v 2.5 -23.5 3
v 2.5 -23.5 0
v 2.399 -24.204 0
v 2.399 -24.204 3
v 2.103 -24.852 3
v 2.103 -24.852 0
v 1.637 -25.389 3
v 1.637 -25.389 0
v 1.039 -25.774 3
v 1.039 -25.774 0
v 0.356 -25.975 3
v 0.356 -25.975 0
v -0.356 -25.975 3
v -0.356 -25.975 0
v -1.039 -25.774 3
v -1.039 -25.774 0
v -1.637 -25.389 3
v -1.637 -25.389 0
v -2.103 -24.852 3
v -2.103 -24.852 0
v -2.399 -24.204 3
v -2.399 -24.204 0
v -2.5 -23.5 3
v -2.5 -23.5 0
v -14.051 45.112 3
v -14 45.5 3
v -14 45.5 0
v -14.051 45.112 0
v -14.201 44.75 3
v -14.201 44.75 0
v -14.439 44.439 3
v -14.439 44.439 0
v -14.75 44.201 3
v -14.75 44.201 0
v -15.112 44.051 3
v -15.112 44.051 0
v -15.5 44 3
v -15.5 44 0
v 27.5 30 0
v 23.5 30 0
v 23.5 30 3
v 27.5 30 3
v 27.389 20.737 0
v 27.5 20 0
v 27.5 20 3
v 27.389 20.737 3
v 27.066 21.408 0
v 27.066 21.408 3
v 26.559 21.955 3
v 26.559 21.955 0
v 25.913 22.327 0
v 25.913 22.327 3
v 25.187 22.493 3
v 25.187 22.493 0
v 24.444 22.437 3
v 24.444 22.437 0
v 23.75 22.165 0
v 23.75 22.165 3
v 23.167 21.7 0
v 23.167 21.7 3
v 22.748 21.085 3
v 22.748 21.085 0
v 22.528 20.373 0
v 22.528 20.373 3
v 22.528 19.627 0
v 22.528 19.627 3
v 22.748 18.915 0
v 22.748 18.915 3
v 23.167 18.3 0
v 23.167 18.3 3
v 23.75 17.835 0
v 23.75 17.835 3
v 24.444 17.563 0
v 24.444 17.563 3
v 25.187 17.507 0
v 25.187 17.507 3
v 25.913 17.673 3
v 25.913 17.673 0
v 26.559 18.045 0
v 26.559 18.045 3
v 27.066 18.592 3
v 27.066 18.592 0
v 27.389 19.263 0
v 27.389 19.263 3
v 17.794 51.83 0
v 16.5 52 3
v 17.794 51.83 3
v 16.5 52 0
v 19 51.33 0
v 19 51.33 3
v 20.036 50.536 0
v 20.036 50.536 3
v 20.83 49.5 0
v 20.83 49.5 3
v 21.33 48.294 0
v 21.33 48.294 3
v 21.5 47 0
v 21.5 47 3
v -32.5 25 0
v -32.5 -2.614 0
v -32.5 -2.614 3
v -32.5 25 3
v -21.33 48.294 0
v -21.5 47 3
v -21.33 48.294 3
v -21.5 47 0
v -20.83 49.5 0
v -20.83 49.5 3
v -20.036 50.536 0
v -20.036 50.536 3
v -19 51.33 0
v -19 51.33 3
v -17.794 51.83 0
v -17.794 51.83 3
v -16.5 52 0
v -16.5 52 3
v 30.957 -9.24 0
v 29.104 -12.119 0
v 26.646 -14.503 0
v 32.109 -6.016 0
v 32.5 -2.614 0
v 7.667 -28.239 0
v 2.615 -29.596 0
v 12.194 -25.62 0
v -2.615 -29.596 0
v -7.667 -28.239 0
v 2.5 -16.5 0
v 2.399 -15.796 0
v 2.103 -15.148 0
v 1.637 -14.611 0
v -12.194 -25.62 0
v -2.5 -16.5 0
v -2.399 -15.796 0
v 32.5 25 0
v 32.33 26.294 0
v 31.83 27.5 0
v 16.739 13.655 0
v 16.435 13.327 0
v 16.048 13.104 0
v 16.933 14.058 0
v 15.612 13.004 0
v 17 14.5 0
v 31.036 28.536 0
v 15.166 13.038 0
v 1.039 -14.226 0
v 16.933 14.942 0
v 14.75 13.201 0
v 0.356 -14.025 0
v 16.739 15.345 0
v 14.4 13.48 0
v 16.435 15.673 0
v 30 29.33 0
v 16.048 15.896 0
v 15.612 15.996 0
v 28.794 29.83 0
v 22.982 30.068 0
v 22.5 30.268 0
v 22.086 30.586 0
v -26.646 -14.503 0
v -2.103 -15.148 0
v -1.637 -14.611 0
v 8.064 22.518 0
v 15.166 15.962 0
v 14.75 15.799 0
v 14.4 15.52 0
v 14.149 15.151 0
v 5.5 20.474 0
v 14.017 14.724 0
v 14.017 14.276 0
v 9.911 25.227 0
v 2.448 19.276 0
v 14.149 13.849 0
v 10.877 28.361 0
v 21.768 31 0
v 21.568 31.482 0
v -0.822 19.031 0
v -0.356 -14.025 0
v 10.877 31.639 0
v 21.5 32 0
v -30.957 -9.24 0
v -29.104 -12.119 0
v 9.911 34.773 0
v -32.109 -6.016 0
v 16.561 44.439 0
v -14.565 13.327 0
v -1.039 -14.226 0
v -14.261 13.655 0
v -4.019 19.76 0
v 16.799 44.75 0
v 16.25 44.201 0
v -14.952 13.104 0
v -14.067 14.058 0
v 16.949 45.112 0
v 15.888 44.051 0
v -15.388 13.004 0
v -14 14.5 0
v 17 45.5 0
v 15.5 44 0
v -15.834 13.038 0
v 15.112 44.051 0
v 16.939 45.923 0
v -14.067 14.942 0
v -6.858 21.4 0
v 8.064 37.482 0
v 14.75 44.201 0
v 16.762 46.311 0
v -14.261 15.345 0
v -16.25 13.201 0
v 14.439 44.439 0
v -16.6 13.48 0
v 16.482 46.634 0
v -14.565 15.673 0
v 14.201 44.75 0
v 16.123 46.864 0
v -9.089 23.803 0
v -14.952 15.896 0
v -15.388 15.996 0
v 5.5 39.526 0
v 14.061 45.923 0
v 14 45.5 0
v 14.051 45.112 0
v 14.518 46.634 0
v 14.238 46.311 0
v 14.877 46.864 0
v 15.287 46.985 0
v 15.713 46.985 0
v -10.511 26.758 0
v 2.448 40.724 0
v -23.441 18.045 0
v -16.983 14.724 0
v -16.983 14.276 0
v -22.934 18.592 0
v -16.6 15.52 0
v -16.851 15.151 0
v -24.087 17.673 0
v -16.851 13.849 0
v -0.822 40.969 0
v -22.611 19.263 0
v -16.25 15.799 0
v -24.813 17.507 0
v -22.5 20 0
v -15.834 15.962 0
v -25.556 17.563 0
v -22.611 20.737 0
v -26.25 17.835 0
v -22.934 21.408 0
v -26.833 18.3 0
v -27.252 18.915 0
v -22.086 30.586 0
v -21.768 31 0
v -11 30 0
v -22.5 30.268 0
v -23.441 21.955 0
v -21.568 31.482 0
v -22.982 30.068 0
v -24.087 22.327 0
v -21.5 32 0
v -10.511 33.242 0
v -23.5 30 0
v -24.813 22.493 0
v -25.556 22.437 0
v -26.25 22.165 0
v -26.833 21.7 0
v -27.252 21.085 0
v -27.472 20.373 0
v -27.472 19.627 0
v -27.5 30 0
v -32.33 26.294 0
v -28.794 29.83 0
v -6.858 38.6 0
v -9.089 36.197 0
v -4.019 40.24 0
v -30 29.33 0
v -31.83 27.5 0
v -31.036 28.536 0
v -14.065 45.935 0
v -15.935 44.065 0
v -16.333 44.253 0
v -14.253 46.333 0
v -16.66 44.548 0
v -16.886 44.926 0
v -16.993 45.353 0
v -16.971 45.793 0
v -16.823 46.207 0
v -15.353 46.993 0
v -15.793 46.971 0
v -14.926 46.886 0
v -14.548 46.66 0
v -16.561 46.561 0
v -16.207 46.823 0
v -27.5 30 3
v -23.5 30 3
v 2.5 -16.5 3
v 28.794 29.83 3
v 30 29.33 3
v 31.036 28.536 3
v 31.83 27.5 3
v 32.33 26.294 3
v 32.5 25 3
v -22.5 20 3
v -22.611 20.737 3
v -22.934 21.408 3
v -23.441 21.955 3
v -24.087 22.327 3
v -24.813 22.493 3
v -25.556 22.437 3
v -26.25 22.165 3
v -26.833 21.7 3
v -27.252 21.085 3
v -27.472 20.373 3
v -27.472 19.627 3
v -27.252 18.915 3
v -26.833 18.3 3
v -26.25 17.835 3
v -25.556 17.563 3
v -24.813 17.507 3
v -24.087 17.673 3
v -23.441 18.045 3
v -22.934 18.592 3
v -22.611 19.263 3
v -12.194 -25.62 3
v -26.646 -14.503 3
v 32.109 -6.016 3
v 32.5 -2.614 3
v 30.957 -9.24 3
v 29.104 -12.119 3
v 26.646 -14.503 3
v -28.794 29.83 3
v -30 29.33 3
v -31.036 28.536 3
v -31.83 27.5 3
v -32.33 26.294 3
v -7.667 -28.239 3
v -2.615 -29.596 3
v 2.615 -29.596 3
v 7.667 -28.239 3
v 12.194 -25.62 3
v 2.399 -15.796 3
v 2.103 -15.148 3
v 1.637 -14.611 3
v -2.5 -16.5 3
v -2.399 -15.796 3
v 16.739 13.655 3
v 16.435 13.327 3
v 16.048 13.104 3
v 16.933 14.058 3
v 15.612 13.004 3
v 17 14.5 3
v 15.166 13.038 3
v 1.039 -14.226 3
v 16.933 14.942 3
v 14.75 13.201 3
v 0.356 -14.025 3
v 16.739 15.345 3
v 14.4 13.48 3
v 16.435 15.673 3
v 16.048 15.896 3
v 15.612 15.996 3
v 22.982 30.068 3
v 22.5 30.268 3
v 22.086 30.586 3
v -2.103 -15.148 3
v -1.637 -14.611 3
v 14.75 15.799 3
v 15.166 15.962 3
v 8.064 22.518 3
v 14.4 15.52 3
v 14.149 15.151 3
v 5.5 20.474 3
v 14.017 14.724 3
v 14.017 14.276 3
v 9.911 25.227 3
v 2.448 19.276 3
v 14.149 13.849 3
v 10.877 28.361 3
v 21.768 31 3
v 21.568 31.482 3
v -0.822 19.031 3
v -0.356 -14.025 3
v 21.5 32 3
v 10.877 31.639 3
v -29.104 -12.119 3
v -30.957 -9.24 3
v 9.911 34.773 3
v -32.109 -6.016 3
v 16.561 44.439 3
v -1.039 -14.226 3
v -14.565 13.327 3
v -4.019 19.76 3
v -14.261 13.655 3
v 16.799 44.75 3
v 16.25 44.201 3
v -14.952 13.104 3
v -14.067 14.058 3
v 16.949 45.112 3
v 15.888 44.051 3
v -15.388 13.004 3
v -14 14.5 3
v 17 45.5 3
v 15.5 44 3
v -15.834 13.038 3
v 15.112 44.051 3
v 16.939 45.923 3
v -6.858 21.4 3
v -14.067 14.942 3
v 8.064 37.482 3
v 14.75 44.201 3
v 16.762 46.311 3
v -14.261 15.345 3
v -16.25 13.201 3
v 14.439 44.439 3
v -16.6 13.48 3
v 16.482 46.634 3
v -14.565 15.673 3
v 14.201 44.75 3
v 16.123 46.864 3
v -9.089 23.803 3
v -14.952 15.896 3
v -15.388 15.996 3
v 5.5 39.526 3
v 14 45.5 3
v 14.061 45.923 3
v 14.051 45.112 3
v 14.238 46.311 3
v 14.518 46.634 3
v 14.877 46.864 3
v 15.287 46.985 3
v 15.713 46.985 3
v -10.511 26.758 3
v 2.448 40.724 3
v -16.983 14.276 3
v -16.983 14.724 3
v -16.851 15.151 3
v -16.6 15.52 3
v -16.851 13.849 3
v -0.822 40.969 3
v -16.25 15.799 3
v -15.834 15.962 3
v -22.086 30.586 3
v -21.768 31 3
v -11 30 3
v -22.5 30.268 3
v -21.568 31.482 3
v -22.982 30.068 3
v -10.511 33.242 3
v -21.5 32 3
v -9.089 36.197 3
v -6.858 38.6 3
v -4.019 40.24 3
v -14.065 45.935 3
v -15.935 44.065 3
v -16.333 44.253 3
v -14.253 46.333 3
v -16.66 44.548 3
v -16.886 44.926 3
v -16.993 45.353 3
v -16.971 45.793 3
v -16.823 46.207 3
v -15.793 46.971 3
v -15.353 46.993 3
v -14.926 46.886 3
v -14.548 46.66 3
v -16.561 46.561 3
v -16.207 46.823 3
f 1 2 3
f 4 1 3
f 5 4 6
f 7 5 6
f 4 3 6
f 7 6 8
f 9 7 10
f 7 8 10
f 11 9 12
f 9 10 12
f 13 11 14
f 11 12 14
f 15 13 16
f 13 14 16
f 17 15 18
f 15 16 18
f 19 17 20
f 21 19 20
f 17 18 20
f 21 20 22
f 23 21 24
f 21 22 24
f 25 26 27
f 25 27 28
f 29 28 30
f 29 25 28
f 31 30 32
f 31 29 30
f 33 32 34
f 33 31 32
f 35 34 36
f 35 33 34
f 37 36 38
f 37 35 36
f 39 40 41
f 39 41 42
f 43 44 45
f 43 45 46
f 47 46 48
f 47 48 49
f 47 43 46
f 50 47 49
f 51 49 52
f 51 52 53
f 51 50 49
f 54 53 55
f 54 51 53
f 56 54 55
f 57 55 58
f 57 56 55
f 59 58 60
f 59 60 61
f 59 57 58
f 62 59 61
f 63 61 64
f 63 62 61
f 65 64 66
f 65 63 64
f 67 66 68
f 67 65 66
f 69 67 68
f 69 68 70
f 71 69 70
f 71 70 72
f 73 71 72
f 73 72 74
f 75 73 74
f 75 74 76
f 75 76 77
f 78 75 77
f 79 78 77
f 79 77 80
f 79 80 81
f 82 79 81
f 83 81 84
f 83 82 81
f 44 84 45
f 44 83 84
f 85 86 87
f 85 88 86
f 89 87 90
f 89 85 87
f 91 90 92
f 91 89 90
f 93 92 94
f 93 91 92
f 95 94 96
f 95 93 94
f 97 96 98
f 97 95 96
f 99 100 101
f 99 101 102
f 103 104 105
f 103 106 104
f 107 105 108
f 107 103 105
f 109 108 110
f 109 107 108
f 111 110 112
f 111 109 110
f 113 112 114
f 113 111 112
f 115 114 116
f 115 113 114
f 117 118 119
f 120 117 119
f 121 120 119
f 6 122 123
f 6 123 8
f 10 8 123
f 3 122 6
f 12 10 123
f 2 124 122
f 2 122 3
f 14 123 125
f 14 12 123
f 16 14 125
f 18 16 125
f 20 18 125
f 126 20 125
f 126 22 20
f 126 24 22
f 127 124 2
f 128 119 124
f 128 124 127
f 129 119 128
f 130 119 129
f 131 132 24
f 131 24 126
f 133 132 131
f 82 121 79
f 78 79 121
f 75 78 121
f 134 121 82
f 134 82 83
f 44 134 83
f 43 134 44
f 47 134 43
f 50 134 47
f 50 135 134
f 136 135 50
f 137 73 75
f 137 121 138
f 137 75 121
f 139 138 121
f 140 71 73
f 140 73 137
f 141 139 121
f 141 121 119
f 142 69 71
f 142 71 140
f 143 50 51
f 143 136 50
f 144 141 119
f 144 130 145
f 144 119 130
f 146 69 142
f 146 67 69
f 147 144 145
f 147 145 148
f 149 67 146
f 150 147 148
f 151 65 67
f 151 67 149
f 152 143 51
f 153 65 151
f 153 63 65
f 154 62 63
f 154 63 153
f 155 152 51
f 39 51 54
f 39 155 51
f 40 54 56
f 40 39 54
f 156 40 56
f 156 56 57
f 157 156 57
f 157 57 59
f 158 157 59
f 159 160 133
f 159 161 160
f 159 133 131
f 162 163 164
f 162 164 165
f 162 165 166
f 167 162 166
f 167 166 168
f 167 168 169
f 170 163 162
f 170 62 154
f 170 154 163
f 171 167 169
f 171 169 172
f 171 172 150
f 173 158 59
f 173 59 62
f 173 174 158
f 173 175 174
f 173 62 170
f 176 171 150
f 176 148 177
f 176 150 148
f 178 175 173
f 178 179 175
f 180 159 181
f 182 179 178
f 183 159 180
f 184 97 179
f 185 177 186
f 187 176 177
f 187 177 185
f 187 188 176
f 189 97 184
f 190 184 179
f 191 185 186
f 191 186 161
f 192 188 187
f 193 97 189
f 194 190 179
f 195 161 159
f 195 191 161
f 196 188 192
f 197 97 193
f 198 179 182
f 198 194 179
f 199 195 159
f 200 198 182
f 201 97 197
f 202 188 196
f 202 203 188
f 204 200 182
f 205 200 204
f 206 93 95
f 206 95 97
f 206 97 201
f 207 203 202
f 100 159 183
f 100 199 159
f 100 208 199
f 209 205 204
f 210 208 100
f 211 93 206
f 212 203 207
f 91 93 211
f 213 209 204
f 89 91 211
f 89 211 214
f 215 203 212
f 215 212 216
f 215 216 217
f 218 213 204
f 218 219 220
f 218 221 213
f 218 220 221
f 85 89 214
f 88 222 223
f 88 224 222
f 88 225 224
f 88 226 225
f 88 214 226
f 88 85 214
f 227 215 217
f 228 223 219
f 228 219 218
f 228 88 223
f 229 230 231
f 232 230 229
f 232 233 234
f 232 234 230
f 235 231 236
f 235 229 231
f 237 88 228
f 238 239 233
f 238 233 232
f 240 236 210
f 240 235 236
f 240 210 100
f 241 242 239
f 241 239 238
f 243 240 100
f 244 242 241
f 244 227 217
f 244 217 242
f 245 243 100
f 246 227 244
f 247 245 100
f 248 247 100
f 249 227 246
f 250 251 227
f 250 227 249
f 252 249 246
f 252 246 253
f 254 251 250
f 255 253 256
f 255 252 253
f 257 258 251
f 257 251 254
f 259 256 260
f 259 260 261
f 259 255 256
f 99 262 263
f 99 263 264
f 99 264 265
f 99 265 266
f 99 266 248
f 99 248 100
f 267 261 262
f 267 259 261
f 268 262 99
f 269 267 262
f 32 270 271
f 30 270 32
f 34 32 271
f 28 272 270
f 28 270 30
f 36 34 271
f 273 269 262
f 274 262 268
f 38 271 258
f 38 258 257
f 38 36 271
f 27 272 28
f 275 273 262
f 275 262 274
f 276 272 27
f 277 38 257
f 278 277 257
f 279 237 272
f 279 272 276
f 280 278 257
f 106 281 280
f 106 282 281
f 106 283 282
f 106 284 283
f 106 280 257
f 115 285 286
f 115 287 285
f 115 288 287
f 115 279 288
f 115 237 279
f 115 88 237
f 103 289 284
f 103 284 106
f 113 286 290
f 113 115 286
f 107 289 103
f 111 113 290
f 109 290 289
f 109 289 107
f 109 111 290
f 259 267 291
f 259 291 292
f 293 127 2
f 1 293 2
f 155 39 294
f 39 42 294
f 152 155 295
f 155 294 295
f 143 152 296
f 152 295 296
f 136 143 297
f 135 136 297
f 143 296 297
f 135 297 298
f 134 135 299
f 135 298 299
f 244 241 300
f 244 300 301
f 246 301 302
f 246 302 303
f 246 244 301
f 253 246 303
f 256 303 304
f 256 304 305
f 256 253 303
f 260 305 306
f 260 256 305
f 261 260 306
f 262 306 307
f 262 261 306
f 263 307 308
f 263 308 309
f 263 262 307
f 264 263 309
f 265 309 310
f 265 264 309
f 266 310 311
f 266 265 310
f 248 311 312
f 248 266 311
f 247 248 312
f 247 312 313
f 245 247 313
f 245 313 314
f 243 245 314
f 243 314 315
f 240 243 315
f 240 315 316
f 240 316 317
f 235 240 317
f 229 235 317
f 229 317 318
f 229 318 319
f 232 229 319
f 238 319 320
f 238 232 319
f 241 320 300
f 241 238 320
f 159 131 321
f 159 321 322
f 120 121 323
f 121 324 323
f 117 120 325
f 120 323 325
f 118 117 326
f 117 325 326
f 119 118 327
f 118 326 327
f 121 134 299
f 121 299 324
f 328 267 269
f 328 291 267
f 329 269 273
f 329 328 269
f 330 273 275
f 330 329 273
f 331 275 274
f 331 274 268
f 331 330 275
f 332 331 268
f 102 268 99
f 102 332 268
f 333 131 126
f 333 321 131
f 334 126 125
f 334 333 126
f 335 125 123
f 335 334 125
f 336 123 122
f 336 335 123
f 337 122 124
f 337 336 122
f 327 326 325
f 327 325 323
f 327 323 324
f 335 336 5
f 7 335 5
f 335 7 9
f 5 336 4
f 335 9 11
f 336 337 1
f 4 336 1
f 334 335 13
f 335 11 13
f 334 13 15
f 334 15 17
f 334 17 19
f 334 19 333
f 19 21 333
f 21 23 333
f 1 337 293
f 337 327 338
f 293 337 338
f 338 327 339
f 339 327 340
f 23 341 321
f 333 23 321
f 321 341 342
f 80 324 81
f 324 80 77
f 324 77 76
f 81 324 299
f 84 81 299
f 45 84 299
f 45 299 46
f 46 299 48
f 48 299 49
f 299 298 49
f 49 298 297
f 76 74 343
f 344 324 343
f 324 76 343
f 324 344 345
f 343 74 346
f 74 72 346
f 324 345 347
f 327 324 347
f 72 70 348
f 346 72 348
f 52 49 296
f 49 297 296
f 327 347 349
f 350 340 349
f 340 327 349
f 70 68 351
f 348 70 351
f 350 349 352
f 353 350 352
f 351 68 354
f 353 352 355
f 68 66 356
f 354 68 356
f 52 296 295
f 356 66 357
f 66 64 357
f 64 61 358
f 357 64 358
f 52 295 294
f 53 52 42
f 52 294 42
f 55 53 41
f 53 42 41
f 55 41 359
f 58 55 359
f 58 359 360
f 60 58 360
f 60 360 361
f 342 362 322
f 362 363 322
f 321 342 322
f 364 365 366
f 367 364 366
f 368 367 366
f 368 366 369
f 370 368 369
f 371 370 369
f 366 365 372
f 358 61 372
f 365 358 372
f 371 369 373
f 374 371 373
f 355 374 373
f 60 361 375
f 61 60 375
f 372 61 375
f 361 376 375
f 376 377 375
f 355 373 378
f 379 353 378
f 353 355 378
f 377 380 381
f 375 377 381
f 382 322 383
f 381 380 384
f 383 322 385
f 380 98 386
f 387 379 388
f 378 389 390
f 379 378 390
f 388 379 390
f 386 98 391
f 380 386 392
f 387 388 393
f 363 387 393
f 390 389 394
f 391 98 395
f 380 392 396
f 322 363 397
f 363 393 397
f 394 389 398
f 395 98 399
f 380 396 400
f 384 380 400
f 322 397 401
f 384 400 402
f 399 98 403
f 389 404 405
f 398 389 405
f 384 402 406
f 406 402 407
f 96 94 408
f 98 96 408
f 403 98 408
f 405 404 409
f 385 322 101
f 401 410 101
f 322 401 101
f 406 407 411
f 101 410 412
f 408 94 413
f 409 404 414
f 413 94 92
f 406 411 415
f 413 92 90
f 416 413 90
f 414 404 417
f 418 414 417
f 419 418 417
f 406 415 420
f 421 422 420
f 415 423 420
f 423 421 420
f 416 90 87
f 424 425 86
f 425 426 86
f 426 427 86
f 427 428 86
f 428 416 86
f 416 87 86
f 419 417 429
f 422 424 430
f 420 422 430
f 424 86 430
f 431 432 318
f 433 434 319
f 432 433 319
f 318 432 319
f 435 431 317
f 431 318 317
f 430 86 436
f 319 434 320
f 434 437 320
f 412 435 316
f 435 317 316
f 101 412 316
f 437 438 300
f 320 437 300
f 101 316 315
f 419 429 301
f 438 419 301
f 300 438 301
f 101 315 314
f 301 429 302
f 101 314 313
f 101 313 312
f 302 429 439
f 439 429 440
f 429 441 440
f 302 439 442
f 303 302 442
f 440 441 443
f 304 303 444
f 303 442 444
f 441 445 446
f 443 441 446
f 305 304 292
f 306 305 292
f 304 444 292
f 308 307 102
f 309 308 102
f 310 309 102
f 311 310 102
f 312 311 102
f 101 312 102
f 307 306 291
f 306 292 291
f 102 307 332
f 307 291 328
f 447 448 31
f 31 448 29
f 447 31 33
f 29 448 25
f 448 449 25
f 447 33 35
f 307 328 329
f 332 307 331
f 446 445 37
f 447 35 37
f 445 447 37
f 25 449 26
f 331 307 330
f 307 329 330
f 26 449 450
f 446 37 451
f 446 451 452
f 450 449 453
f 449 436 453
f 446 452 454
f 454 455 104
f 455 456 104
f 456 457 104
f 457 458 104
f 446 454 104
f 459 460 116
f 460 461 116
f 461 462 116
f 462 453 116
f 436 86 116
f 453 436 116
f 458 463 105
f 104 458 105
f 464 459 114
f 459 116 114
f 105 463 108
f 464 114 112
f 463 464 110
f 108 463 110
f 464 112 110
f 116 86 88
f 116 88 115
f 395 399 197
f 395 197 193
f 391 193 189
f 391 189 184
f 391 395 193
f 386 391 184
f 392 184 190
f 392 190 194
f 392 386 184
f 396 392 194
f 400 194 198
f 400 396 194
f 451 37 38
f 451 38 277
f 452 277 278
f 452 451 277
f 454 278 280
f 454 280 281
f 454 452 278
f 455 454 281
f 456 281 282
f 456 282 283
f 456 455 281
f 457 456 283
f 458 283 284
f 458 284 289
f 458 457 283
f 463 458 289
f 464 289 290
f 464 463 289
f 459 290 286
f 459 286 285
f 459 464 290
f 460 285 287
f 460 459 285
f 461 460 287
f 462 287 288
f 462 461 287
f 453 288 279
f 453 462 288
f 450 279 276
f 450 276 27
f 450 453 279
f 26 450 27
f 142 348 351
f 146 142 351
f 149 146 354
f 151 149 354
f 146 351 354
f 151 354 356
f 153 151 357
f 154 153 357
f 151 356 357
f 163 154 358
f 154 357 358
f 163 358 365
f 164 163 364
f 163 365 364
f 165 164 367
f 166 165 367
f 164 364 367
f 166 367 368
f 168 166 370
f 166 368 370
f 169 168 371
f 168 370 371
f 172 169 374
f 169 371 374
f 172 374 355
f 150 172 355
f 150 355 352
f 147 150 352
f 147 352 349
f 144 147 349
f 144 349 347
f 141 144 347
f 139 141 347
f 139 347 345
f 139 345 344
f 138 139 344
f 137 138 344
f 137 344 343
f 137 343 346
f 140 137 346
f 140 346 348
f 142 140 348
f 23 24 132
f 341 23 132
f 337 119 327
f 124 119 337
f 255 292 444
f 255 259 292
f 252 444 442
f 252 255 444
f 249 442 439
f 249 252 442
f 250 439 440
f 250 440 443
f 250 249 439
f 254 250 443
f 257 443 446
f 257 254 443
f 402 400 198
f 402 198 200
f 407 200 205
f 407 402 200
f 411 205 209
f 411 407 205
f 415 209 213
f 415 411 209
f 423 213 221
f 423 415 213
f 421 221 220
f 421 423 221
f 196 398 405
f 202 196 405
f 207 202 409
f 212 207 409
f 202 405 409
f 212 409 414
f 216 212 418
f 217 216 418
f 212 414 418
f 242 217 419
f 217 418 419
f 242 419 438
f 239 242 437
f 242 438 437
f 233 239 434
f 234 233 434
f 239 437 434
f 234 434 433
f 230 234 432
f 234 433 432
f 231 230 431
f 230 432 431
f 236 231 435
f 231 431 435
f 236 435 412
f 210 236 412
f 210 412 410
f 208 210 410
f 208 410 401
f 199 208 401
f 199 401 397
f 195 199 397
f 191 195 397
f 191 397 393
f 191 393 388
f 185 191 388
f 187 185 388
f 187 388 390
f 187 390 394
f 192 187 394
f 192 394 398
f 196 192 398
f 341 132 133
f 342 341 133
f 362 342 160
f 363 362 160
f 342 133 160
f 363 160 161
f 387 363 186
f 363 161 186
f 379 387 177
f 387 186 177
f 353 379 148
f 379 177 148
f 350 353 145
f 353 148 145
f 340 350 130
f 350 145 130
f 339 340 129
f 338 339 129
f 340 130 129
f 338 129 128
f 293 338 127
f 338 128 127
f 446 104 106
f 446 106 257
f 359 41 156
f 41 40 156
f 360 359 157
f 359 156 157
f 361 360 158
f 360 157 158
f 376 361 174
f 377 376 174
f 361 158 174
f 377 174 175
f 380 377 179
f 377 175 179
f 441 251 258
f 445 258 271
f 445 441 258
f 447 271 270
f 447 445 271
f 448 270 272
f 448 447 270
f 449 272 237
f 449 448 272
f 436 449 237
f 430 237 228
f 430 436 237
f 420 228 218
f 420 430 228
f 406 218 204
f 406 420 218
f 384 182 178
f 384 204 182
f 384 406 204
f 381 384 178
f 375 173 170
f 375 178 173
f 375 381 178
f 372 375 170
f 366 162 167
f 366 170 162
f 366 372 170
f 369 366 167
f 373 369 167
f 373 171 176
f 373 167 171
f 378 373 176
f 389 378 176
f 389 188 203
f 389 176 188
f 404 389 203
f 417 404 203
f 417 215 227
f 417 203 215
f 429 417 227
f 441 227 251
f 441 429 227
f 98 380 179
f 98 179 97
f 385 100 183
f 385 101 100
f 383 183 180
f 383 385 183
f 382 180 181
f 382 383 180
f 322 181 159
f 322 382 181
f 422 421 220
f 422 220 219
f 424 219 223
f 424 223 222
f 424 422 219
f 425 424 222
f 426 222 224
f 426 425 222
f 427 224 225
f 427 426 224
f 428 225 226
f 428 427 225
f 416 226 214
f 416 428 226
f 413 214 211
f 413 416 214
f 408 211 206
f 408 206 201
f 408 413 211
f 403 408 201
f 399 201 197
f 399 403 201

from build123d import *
from OCP.BRepFilletAPI import BRepFilletAPI_MakeFillet

# Parameters (mm, degrees)
SKETCH1_R           = 2.5
BOSS_EXTRUDE1_DEPTH = 3
BOSS_EXTRUDE3_DEPTH = 3
FILLET1_R1          = 5
FILLET1_R2          = 15
FILLET1_R3          = 20
FILLET1_R4          = 2
SKETCH3_6_R         = 1.5
CUT_EXTRUDE2_DEPTH  = 62.394217969


with BuildPart() as part:
    # Sketch1 → Boss-Extrude1 (new body)
    with BuildSketch(Plane.XY):
        Polygon((-32.5, 30), (32.5, 30), (32.5, -10), (0, -35), (-32.5, -10), align=None)
        with Locations((25, 20)):
            Circle(SKETCH1_R, mode=Mode.SUBTRACT)
        with Locations((-25, 20)):
            Circle(SKETCH1_R, mode=Mode.SUBTRACT)
        with BuildLine():
            Line((2.5, -16.5), (2.5, -23.5))
            ThreePointArc((2.5, -23.5), (0, -26), (-2.5, -23.5))
            Line((-2.5, -23.5), (-2.5, -16.5))
            ThreePointArc((-2.5, -16.5), (0, -14), (2.5, -16.5))
        make_face(mode=Mode.SUBTRACT)
    extrude(amount=BOSS_EXTRUDE1_DEPTH)

    # Sketch3 → Boss-Extrude3 (add)
    with BuildSketch(Plane.XY.offset(3)):
        with BuildLine():
            ThreePointArc((-15.5, 44), (-16.560660172, 46.560660172), (-14, 45.5))
            Line((-14, 45.5), (14, 45.5))
            ThreePointArc((14, 45.5), (15.5, 47), (17, 45.5))
            ThreePointArc((17, 45.5), (16.560660172, 44.439339828), (15.5, 44))
            Line((15.5, 44), (15.5, 30))
            Line((15.5, 30), (21.5, 30))
            Line((21.5, 30), (21.5, 52))
            Line((21.5, 52), (-21.5, 52))
            Line((-21.5, 52), (-21.5, 30))
            Line((-21.5, 30), (-15.5, 30))
            Line((-15.5, 30), (-15.5, 44))
        make_face()
        with BuildLine():
            Line((14, 45.5), (-14, 45.5))
            ThreePointArc((-14, 45.5), (-14.439339828, 44.439339828), (-15.5, 44))
            Line((-15.5, 44), (-15.5, 30))
            Line((-15.5, 30), (-11, 30))
            ThreePointArc((-11, 30), (0, 41), (11, 30))
            Line((11, 30), (15.5, 30))
            Line((15.5, 30), (15.5, 44))
            ThreePointArc((15.5, 44), (14.439339828, 44.439339828), (14, 45.5))
        make_face()
    extrude(amount=-BOSS_EXTRUDE3_DEPTH)

    # Fillet1: one fillet with a radius per group of edges: ONE call of the kernel's fillet builder (fillet() takes one radius for all edges)
    fillet1_edges_1 = [part.edges().sort_by_distance(p)[0] for p in [
        (32.5, 30, 1.5),
        (-32.5, 30, 1.5),
        (-21.5, 52, 1.5),
        (21.5, 52, 1.5),
    ]]
    fillet1_edges_2 = [part.edges().sort_by_distance(p)[0] for p in [
        (-32.5, -10, 1.5),
        (32.5, -10, 1.5),
    ]]
    fillet1_edges_3 = [part.edges().sort_by_distance(p)[0] for p in [
        (0, -35, 1.5),
    ]]
    fillet1_edges_4 = [part.edges().sort_by_distance(p)[0] for p in [
        (21.5, 30, 1.5),
        (-21.5, 30, 1.5),
    ]]
    fillet1 = BRepFilletAPI_MakeFillet(part.part.solid().wrapped)
    for e in fillet1_edges_1:
        fillet1.Add(FILLET1_R1, e.wrapped)
    for e in fillet1_edges_2:
        fillet1.Add(FILLET1_R2, e.wrapped)
    for e in fillet1_edges_3:
        fillet1.Add(FILLET1_R3, e.wrapped)
    for e in fillet1_edges_4:
        fillet1.Add(FILLET1_R4, e.wrapped)
    add(Compound.cast(fillet1.Shape()), mode=Mode.REPLACE)

    # Sketch3<6> → Cut-Extrude2 (cut, through all)
    with BuildSketch(Plane.XY.offset(3)):
        with Locations((15.5, 14.5)):
            Circle(SKETCH3_6_R)
        with Locations((-15.5, 14.5)):
            Circle(SKETCH3_6_R)
        with BuildLine():
            ThreePointArc((-11, 30), (0, 19), (11, 30))
            Line((11, 30), (-11, 30))
        make_face()
        with BuildLine():
            Line((-11, 30), (11, 30))
            ThreePointArc((11, 30), (0, 41), (-11, 30))
        make_face()
    extrude(amount=-CUT_EXTRUDE2_DEPTH, mode=Mode.SUBTRACT)


solid = part.part
